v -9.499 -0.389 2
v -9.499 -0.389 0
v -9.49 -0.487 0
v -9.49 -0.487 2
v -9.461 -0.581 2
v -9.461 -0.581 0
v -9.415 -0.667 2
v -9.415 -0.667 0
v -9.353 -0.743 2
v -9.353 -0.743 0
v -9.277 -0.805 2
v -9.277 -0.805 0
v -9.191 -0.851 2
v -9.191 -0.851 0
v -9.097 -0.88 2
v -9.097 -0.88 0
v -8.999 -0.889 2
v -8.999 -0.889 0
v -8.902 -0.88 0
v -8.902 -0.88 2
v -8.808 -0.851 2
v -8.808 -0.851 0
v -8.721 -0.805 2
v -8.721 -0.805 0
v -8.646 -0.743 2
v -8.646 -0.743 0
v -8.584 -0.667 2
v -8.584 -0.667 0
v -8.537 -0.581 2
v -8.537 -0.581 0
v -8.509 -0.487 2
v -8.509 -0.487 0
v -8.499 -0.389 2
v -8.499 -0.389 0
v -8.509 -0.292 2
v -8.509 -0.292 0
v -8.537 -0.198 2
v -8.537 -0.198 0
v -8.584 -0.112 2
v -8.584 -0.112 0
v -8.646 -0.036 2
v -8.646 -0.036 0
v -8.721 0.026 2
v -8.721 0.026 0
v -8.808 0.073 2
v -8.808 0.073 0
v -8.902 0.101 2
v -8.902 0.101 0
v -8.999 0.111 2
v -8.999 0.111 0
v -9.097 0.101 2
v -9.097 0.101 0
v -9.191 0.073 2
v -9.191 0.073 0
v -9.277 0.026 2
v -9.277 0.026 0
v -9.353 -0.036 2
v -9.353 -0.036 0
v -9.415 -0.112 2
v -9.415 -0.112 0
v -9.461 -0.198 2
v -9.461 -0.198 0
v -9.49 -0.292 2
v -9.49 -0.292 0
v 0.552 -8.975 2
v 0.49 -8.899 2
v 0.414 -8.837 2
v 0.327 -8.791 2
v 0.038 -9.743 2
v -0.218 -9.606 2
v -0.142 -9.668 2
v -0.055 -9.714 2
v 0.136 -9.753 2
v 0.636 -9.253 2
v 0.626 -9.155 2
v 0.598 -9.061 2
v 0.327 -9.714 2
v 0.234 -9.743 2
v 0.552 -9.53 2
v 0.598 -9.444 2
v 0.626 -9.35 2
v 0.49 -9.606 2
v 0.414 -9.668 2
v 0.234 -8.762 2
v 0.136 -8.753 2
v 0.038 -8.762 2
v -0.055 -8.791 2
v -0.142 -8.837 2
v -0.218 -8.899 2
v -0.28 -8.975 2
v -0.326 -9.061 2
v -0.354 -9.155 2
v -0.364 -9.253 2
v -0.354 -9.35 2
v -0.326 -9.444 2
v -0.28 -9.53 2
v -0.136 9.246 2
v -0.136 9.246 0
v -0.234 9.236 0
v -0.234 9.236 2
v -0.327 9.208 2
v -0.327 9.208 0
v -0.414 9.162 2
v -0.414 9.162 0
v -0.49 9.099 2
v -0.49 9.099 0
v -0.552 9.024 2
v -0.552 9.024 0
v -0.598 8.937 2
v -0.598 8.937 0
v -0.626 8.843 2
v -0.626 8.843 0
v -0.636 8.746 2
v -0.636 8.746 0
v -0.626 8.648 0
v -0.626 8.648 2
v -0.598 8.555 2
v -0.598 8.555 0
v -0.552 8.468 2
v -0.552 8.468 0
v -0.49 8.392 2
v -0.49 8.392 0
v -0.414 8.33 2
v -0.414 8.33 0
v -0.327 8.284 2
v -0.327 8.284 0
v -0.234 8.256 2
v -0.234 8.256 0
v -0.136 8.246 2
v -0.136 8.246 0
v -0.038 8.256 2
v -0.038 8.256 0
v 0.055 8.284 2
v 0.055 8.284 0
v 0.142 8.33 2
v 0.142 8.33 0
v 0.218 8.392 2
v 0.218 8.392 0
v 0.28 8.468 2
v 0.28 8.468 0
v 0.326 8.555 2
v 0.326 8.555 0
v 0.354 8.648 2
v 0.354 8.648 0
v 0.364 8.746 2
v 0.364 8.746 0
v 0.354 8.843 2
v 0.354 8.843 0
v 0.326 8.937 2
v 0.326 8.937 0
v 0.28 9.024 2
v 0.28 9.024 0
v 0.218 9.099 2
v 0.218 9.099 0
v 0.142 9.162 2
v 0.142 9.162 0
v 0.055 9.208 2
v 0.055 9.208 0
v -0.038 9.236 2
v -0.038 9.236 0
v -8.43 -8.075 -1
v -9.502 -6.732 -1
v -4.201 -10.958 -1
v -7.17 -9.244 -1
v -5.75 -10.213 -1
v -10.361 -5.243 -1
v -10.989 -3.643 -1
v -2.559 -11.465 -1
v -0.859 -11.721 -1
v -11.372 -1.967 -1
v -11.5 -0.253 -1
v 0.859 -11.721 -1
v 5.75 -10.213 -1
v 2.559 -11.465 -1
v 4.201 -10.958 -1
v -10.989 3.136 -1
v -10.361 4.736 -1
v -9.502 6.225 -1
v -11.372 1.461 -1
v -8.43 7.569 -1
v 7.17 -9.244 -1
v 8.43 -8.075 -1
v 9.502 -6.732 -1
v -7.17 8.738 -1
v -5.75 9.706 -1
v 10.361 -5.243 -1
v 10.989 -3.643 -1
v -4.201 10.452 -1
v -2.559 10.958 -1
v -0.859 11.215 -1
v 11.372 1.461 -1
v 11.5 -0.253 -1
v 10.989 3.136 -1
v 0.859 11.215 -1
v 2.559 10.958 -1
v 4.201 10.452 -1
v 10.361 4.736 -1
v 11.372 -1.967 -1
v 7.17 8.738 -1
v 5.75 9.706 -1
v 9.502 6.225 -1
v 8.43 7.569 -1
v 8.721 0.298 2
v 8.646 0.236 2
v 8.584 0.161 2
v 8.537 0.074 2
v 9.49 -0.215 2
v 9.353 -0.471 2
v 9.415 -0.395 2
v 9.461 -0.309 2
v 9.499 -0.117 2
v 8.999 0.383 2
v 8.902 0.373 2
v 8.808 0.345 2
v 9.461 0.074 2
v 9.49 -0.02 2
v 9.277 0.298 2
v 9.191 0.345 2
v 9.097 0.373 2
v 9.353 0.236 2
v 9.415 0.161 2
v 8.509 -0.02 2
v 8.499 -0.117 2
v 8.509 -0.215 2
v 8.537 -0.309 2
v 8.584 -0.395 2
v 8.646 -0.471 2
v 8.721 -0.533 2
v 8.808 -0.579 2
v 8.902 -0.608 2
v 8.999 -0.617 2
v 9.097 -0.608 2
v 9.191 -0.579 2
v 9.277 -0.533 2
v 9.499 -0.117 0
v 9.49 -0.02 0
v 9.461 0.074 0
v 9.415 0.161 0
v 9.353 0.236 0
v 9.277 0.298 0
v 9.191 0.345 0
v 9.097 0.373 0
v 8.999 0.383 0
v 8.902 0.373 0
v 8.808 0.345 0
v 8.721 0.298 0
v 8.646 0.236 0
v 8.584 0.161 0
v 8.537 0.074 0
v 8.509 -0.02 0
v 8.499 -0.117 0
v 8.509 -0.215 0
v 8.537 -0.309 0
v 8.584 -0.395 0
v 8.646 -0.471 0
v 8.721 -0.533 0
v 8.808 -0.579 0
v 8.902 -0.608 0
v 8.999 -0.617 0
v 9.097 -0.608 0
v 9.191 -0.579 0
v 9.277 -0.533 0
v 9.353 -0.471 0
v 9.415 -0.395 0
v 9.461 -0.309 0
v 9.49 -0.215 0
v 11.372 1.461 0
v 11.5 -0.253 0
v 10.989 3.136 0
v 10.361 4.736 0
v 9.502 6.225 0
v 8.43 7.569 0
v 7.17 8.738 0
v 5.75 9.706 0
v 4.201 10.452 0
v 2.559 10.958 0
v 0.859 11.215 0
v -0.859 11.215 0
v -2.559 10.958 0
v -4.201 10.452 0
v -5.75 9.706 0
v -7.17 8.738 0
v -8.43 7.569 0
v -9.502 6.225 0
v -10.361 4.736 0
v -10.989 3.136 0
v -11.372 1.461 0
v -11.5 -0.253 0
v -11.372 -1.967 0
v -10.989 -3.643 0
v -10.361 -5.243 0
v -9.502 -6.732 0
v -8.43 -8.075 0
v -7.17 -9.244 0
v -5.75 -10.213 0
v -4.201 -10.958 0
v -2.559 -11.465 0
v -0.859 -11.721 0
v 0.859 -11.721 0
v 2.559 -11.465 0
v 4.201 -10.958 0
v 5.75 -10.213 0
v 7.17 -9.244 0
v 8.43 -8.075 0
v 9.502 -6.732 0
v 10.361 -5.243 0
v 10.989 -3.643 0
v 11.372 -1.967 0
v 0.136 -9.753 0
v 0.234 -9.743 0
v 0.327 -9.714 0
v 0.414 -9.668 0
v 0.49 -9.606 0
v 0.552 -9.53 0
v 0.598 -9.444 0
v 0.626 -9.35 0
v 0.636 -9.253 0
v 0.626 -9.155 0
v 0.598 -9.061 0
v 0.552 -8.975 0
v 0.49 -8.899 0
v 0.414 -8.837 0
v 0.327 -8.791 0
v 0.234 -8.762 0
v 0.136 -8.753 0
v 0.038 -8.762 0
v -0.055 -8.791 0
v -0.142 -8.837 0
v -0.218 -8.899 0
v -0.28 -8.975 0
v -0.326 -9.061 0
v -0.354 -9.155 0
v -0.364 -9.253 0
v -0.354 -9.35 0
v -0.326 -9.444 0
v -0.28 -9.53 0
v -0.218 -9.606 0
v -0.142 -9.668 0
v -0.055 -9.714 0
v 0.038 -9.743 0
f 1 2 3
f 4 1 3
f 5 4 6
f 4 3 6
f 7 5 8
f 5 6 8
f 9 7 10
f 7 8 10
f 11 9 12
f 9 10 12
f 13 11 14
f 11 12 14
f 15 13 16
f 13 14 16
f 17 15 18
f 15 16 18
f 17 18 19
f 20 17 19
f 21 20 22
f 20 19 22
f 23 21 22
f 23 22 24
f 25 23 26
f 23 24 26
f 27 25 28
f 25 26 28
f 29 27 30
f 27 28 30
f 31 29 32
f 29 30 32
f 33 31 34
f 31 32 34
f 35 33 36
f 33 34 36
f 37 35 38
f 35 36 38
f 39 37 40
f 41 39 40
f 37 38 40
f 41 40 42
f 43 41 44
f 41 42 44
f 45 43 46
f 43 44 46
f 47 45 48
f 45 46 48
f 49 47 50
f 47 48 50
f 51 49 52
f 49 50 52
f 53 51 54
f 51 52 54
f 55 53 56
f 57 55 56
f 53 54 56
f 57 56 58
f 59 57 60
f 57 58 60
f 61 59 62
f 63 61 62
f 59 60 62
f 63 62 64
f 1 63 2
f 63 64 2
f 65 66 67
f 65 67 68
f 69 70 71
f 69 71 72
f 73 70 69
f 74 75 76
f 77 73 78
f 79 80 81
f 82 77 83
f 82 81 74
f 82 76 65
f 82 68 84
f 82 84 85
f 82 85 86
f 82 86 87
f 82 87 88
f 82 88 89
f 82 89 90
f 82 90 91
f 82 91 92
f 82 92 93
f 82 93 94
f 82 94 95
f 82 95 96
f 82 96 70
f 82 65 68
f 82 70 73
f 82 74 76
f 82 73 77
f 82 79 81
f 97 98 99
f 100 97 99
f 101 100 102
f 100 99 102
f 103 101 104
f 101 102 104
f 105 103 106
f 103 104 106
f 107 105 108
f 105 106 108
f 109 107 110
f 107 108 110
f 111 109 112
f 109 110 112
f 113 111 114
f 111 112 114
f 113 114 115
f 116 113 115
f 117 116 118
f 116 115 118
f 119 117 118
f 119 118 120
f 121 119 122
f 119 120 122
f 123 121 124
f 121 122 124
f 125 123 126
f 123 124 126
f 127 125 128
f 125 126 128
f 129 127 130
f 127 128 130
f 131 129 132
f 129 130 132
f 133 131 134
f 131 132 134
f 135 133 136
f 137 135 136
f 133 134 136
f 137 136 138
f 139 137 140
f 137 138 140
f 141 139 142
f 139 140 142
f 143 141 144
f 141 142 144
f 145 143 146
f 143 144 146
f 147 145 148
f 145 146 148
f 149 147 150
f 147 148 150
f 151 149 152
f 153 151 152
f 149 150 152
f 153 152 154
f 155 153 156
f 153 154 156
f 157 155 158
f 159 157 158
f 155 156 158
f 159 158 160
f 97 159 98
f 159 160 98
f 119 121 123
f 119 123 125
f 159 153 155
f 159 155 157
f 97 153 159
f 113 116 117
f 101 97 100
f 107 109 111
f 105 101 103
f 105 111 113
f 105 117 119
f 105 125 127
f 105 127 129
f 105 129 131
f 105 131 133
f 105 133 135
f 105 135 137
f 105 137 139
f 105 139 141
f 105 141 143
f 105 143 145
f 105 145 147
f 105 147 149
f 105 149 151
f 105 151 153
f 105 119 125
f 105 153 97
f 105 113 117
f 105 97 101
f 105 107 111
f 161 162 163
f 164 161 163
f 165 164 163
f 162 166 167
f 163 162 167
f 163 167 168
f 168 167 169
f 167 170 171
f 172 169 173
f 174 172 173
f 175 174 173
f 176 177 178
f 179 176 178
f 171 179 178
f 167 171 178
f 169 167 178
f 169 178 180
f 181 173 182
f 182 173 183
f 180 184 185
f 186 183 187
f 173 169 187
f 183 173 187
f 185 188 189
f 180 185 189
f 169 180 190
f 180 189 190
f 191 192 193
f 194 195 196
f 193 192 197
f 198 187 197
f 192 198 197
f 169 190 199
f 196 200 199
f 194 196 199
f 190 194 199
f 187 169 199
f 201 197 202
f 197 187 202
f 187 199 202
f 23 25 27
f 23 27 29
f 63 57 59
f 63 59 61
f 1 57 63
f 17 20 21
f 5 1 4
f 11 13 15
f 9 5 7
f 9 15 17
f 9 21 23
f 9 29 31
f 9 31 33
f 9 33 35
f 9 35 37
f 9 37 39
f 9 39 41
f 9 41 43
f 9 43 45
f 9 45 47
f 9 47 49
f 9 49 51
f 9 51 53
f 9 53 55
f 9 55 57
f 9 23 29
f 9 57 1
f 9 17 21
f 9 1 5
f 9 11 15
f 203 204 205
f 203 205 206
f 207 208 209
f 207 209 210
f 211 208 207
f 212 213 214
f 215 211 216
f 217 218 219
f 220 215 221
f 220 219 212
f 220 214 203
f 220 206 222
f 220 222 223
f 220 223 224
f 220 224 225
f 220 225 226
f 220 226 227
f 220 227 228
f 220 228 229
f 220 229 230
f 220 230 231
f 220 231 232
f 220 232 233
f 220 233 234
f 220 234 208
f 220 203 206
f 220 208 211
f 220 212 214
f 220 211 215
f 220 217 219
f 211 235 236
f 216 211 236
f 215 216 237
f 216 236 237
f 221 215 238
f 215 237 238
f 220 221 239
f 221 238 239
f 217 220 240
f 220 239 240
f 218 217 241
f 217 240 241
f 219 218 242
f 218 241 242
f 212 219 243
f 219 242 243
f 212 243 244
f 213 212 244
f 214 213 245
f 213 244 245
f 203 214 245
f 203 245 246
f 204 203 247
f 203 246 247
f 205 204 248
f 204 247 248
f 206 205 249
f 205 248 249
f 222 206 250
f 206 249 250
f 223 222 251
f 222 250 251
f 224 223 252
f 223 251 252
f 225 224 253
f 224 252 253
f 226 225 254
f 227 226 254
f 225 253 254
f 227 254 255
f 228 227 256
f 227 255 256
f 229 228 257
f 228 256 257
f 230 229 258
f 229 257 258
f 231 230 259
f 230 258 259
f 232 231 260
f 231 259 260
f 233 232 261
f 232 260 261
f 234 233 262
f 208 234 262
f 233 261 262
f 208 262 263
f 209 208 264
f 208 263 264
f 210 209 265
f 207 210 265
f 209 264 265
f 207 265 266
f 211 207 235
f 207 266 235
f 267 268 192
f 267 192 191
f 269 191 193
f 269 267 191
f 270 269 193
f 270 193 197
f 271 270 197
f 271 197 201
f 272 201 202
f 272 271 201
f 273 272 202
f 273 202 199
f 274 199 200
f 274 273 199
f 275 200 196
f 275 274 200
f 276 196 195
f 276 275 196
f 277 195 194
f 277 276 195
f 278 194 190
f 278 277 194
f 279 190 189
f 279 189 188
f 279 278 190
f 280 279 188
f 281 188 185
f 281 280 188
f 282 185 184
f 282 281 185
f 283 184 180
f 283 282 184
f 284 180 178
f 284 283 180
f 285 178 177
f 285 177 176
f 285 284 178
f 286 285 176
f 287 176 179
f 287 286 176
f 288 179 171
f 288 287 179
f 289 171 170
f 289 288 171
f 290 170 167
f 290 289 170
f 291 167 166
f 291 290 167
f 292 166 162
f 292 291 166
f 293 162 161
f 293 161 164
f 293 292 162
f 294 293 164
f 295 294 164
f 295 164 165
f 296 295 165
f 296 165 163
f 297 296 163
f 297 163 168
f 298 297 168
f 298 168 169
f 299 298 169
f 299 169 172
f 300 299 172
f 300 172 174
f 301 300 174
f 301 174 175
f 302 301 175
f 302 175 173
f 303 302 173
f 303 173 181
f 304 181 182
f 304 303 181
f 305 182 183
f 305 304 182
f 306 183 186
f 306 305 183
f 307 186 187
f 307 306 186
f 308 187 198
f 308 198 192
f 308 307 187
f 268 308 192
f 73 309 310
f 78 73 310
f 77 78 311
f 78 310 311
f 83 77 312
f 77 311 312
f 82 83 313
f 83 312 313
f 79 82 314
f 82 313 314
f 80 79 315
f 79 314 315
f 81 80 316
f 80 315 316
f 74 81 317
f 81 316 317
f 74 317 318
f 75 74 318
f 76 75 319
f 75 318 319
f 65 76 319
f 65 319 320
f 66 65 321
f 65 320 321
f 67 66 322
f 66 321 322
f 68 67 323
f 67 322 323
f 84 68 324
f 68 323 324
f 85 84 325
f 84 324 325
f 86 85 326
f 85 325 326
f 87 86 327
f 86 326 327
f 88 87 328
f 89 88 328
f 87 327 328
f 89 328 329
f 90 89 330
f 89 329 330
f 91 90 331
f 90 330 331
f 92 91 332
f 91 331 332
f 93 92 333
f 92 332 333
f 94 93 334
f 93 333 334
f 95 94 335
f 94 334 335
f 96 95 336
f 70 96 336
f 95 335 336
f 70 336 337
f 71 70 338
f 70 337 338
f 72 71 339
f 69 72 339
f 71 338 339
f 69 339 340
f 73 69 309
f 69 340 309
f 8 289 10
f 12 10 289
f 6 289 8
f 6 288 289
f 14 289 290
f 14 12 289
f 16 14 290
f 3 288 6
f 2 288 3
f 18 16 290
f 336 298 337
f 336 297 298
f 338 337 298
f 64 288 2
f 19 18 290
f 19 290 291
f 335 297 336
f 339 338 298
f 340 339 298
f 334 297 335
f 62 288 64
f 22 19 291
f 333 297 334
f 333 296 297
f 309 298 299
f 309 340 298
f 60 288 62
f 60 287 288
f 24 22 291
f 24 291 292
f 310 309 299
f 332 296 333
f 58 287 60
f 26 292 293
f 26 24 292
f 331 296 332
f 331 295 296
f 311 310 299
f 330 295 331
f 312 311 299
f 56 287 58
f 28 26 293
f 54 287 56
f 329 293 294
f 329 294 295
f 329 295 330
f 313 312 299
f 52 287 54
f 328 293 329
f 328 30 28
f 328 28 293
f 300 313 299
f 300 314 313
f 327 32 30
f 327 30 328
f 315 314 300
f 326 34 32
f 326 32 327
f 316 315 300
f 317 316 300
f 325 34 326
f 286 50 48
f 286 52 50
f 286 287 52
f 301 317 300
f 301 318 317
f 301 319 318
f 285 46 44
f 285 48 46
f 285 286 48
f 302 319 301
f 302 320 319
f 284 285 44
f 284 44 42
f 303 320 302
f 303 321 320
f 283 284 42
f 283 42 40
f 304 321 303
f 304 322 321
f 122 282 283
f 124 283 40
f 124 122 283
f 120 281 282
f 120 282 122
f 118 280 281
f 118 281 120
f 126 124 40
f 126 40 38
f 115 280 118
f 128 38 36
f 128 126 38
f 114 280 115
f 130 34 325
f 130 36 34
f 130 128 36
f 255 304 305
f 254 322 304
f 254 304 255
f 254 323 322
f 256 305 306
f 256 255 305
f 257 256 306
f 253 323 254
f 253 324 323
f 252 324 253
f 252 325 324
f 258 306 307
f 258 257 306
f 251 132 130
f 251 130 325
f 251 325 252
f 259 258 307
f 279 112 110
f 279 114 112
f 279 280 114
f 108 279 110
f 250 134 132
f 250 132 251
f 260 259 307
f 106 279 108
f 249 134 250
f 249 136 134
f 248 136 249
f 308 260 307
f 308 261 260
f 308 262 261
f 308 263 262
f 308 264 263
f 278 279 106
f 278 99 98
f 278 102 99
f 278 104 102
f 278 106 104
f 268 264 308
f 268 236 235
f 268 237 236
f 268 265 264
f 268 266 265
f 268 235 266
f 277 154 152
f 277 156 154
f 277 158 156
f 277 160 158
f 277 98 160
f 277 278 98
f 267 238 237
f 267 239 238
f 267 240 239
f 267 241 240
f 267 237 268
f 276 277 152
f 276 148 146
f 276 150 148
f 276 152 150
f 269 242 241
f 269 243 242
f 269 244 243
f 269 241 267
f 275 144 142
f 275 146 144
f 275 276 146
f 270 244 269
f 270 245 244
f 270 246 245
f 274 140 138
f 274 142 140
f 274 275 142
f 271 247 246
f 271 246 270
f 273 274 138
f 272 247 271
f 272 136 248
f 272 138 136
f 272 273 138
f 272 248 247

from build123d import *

# Parameters (mm, degrees)
SKETCH1_R           = 11.5
BOSS_EXTRUDE1_DEPTH = 1
SKETCH4_R           = 0.5
BOSS_EXTRUDE4_DEPTH = 2
CIRPATTERN3_COUNT   = 4


with BuildPart() as part:
    # Sketch1 → Boss-Extrude1 (new body)
    with BuildSketch(Plane.XY):
        with Locations((0, -0.253320711)):
            Circle(SKETCH1_R)
    extrude(amount=-BOSS_EXTRUDE1_DEPTH)

    # Sketch4 → Boss-Extrude4 (add)
    with BuildSketch(Plane.XY):
        with Locations((8.999235852, -0.117277767)):
            Circle(SKETCH4_R)
    boss_extrude4 = extrude(amount=BOSS_EXTRUDE4_DEPTH)

    # CirPattern3: Boss-Extrude4 ×4 about axis
    cirpattern3_axis = Axis((0, -0.253320711, 0), (0, 0, 1))
    for i in range(1, CIRPATTERN3_COUNT):
        add(boss_extrude4.rotate(cirpattern3_axis, i * 360 / CIRPATTERN3_COUNT))


solid = part.part
